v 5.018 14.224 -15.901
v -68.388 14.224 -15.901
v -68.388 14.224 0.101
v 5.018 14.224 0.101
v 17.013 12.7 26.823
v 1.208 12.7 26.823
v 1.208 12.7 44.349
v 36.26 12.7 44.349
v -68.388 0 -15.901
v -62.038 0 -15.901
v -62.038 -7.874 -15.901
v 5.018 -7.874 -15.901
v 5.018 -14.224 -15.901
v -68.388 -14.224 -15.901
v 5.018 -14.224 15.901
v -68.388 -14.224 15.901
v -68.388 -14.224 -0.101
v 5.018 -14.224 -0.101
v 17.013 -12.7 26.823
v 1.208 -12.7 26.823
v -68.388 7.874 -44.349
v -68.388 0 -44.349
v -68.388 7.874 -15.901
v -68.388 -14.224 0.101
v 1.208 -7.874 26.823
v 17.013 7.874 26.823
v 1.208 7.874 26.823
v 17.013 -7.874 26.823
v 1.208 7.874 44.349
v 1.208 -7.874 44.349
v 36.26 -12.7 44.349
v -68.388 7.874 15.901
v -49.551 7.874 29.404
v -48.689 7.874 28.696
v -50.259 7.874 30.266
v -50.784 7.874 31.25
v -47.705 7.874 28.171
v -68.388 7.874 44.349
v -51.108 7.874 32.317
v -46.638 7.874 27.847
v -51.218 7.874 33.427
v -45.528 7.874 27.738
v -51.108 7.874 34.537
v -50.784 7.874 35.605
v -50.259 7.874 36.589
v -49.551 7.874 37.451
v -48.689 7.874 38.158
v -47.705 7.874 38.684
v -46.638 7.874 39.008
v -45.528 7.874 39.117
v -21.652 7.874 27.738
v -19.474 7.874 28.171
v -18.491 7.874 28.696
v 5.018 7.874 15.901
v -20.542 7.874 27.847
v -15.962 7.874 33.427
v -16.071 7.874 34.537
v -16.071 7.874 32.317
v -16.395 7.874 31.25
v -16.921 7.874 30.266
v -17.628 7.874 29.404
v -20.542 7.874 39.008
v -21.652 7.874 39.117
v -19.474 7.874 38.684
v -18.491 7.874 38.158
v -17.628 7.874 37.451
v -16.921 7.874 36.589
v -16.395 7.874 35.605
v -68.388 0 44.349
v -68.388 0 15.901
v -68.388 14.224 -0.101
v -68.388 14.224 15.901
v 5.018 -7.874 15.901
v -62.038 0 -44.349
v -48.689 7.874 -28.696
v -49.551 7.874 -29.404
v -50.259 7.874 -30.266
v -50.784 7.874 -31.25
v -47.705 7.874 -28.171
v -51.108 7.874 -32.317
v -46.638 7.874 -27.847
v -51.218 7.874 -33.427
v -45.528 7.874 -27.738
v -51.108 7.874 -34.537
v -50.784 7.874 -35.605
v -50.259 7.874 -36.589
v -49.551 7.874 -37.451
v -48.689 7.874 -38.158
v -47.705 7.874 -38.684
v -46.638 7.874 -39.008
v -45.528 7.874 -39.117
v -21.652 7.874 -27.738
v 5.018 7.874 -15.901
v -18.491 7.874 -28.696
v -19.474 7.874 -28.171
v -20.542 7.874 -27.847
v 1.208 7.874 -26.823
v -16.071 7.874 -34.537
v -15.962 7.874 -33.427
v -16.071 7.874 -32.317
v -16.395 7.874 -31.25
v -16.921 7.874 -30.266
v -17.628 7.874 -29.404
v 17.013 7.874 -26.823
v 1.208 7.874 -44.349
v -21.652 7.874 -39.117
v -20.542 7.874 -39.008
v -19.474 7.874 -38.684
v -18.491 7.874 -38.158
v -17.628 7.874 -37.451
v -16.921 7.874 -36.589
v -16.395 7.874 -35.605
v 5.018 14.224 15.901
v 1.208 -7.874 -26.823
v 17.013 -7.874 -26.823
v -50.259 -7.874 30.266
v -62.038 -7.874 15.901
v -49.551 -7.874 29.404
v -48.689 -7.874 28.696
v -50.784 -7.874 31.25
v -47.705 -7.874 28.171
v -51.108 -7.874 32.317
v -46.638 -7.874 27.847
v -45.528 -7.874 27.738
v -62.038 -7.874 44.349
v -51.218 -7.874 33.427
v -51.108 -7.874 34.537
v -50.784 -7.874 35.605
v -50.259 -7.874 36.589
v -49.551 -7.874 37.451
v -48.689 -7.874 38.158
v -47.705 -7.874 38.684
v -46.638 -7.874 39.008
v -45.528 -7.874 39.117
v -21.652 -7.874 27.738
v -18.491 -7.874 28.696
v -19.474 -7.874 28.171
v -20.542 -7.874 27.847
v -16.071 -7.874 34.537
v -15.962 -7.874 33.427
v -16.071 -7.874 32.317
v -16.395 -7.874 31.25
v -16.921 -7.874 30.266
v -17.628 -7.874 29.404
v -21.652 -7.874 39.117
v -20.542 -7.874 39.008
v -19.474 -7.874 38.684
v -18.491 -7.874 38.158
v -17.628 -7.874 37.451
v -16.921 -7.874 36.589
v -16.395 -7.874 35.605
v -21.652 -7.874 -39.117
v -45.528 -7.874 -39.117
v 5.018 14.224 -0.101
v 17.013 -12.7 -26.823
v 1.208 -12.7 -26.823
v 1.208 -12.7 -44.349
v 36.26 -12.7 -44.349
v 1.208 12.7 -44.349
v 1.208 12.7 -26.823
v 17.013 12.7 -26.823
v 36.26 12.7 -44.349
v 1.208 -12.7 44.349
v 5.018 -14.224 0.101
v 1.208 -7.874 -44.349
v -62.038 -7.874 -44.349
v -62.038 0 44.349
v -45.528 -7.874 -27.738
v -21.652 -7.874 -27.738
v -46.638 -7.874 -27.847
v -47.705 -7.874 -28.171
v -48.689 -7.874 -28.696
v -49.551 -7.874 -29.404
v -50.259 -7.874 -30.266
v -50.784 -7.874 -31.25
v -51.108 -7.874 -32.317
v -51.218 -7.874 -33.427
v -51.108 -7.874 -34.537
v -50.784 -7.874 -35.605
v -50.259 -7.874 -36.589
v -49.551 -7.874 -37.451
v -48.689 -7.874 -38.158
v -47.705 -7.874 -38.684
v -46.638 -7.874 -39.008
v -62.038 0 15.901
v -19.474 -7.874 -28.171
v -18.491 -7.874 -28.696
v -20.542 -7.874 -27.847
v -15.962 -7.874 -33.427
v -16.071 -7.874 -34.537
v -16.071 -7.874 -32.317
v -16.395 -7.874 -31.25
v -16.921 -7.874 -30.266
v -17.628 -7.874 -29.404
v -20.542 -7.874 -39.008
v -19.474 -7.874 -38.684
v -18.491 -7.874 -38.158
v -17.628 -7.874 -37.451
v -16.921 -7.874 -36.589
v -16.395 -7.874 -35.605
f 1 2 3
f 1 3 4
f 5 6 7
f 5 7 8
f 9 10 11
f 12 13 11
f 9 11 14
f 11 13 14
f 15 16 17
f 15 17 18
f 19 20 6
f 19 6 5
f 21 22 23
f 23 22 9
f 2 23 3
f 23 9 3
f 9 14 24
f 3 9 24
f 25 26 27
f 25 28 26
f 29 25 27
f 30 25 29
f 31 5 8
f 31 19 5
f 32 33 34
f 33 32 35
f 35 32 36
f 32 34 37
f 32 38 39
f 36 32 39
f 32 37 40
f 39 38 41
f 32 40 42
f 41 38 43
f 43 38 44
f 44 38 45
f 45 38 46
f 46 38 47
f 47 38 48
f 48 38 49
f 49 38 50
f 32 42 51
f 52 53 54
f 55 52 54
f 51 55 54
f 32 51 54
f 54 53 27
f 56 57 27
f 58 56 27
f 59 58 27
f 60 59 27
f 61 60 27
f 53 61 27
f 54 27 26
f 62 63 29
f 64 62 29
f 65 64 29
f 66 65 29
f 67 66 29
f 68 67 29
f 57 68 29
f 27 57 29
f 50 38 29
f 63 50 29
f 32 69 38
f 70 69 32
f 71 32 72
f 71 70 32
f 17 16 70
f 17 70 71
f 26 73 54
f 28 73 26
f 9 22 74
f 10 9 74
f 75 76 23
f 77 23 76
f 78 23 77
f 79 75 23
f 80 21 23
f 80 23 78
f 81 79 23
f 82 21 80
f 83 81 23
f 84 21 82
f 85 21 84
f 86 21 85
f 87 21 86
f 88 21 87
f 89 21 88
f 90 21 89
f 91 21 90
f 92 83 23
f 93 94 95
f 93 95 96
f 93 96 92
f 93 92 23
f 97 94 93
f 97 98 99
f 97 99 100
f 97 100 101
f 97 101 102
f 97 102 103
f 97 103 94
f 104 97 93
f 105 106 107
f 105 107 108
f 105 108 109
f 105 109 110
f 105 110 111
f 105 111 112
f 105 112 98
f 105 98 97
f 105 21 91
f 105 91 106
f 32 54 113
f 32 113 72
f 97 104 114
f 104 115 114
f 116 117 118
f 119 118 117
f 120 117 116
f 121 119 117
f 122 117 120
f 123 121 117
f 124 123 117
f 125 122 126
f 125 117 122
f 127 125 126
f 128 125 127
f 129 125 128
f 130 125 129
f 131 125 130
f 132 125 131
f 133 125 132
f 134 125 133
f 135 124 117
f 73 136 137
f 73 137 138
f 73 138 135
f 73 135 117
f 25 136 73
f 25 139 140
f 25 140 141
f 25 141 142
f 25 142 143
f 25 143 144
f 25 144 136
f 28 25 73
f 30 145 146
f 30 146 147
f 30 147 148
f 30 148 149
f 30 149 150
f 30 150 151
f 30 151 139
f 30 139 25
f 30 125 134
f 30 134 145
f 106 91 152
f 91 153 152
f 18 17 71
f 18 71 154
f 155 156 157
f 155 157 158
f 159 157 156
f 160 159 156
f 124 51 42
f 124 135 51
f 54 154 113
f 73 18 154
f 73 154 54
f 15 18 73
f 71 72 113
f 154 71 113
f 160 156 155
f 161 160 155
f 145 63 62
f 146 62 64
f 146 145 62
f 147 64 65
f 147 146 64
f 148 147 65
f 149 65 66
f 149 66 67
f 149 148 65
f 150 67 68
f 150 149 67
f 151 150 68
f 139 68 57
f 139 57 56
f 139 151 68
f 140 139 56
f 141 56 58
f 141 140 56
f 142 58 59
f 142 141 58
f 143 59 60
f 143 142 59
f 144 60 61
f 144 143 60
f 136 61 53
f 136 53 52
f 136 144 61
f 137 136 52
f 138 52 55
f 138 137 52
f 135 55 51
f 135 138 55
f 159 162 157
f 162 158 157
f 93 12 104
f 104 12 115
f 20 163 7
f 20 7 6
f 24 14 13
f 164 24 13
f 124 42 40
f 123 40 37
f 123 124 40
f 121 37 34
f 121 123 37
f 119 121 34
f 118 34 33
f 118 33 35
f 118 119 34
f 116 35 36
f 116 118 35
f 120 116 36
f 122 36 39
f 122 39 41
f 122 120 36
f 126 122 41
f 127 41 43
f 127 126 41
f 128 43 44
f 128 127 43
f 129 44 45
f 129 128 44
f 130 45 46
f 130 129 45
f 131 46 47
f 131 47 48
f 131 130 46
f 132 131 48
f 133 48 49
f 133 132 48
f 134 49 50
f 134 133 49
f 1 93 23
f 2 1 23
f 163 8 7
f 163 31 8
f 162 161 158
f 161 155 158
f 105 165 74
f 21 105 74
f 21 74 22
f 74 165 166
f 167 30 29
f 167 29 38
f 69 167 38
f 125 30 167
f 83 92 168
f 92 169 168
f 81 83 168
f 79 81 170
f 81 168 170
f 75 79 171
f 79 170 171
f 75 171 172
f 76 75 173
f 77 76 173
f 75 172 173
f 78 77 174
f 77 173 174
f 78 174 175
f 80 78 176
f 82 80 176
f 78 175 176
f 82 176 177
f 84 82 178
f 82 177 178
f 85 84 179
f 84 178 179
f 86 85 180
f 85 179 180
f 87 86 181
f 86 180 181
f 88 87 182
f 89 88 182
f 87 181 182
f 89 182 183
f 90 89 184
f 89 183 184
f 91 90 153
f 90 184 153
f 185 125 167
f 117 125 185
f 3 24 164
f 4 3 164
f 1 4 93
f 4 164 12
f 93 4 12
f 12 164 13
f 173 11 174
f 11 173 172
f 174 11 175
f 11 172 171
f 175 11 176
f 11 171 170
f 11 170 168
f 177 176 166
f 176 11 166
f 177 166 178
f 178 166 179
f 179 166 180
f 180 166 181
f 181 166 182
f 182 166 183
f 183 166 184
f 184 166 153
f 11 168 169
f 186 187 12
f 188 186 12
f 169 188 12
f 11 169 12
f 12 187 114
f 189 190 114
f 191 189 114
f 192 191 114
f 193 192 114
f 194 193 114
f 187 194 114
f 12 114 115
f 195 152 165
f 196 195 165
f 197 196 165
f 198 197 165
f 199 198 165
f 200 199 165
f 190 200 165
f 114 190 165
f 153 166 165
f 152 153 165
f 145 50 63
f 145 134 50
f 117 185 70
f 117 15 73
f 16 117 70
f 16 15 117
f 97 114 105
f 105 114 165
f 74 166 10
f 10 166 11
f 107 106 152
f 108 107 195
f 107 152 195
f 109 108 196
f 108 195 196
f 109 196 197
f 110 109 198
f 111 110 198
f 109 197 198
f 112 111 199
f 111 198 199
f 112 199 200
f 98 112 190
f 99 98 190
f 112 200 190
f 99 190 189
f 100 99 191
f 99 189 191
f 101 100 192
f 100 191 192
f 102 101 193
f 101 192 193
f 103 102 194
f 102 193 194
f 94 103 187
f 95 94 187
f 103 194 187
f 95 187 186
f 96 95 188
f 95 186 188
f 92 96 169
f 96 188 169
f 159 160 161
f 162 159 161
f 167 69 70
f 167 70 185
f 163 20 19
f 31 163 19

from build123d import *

# Parameters (mm, degrees)
F1_DEPTH = 28.448
F2_DEPTH = 12.7
F3_DEPTH = 7.874
F4_DEPTH = 28.448
F5_DEPTH = 14.224
F6_DEPTH = 7.874


with BuildPart() as f1:
    # F0 (on Front) → F1 (new body)
    with BuildSketch(Plane.XZ):
        Polygon((5.0182457385, 15.9014282599), (-62.0377542615, 15.9014282599), (-68.3877542615, 15.9014282599), (-68.3877542615, -0.1005717401), (5.0182457385, -0.1005717401), align=None)
    extrude(amount=F1_DEPTH)

    # F4 (cut): a face of the model
    f4_faces = [f1.faces().sort_by_distance(p)[0] for p in [
        (-31.6847542615, -28.448, 7.9004282599),
    ]]
    extrude(f4_faces, amount=-F4_DEPTH, mode=Mode.SUBTRACT)


with BuildPart() as f2:
    # F0 (on Front) → F2 (new body, symmetric)
    with BuildSketch(Plane.XZ):
        Polygon((36.2602457385, 44.3494282599), (1.2082457385, 44.3494282599), (1.2082457385, 26.8234282599), (17.0129421671, 26.8234282599), align=None)
    extrude(amount=F2_DEPTH, both=True)


with BuildPart() as f3:
    # F0 (on Front) → F3 (new body, symmetric)
    with BuildSketch(Plane.XZ):
        Polygon((1.2082457385, 44.3494282599), (-62.0377542615, 44.3494282599), (-62.0377542615, 15.9014282599), (5.0182457385, 15.9014282599), (17.0129421671, 26.8234282599), (1.2082457385, 26.8234282599), align=None)
        with BuildLine():
            ThreePointArc((-21.6517542615, 39.1172810912), (-15.9619014302, 33.4274282599), (-21.6517542615, 27.7375754286))
            Line((-21.6517542615, 27.7375754286), (-45.5277542615, 27.7375754286))
            ThreePointArc((-45.5277542615, 27.7375754286), (-51.2176070928, 33.4274282599), (-45.5277542615, 39.1172810912))
            Line((-45.5277542615, 39.1172810912), (-21.6517542615, 39.1172810912))
        make_face(mode=Mode.SUBTRACT)
    extrude(amount=F3_DEPTH, both=True)

    # F0 (on Front) → F5 (join, symmetric)
    with BuildSketch(Plane.XZ):
        Polygon((5.0182457385, 15.9014282599), (-62.0377542615, 15.9014282599), (-68.3877542615, 15.9014282599), (-68.3877542615, -0.1005717401), (5.0182457385, -0.1005717401), align=None)
    extrude(amount=F5_DEPTH, both=True)

    # F0 (on Front) → F6 (join)
    with BuildSketch(Plane.XZ):
        Polygon((-62.0377542615, 44.3494282599), (-68.3877542615, 44.3494282599), (-68.3877542615, 33.4274282599), (-68.3877542615, 15.9014282599), (-62.0377542615, 15.9014282599), align=None)
    extrude(amount=-F6_DEPTH)


with BuildPart() as f7_1:
    # F7: instance of F2
    add(f2.part.mirror(Plane.XY))


with BuildPart() as f7_2:
    # F7: instance of F3
    add(f3.part.mirror(Plane.XY))


solid = Compound([f2.part, f3.part, f7_1.part, f7_2.part])
